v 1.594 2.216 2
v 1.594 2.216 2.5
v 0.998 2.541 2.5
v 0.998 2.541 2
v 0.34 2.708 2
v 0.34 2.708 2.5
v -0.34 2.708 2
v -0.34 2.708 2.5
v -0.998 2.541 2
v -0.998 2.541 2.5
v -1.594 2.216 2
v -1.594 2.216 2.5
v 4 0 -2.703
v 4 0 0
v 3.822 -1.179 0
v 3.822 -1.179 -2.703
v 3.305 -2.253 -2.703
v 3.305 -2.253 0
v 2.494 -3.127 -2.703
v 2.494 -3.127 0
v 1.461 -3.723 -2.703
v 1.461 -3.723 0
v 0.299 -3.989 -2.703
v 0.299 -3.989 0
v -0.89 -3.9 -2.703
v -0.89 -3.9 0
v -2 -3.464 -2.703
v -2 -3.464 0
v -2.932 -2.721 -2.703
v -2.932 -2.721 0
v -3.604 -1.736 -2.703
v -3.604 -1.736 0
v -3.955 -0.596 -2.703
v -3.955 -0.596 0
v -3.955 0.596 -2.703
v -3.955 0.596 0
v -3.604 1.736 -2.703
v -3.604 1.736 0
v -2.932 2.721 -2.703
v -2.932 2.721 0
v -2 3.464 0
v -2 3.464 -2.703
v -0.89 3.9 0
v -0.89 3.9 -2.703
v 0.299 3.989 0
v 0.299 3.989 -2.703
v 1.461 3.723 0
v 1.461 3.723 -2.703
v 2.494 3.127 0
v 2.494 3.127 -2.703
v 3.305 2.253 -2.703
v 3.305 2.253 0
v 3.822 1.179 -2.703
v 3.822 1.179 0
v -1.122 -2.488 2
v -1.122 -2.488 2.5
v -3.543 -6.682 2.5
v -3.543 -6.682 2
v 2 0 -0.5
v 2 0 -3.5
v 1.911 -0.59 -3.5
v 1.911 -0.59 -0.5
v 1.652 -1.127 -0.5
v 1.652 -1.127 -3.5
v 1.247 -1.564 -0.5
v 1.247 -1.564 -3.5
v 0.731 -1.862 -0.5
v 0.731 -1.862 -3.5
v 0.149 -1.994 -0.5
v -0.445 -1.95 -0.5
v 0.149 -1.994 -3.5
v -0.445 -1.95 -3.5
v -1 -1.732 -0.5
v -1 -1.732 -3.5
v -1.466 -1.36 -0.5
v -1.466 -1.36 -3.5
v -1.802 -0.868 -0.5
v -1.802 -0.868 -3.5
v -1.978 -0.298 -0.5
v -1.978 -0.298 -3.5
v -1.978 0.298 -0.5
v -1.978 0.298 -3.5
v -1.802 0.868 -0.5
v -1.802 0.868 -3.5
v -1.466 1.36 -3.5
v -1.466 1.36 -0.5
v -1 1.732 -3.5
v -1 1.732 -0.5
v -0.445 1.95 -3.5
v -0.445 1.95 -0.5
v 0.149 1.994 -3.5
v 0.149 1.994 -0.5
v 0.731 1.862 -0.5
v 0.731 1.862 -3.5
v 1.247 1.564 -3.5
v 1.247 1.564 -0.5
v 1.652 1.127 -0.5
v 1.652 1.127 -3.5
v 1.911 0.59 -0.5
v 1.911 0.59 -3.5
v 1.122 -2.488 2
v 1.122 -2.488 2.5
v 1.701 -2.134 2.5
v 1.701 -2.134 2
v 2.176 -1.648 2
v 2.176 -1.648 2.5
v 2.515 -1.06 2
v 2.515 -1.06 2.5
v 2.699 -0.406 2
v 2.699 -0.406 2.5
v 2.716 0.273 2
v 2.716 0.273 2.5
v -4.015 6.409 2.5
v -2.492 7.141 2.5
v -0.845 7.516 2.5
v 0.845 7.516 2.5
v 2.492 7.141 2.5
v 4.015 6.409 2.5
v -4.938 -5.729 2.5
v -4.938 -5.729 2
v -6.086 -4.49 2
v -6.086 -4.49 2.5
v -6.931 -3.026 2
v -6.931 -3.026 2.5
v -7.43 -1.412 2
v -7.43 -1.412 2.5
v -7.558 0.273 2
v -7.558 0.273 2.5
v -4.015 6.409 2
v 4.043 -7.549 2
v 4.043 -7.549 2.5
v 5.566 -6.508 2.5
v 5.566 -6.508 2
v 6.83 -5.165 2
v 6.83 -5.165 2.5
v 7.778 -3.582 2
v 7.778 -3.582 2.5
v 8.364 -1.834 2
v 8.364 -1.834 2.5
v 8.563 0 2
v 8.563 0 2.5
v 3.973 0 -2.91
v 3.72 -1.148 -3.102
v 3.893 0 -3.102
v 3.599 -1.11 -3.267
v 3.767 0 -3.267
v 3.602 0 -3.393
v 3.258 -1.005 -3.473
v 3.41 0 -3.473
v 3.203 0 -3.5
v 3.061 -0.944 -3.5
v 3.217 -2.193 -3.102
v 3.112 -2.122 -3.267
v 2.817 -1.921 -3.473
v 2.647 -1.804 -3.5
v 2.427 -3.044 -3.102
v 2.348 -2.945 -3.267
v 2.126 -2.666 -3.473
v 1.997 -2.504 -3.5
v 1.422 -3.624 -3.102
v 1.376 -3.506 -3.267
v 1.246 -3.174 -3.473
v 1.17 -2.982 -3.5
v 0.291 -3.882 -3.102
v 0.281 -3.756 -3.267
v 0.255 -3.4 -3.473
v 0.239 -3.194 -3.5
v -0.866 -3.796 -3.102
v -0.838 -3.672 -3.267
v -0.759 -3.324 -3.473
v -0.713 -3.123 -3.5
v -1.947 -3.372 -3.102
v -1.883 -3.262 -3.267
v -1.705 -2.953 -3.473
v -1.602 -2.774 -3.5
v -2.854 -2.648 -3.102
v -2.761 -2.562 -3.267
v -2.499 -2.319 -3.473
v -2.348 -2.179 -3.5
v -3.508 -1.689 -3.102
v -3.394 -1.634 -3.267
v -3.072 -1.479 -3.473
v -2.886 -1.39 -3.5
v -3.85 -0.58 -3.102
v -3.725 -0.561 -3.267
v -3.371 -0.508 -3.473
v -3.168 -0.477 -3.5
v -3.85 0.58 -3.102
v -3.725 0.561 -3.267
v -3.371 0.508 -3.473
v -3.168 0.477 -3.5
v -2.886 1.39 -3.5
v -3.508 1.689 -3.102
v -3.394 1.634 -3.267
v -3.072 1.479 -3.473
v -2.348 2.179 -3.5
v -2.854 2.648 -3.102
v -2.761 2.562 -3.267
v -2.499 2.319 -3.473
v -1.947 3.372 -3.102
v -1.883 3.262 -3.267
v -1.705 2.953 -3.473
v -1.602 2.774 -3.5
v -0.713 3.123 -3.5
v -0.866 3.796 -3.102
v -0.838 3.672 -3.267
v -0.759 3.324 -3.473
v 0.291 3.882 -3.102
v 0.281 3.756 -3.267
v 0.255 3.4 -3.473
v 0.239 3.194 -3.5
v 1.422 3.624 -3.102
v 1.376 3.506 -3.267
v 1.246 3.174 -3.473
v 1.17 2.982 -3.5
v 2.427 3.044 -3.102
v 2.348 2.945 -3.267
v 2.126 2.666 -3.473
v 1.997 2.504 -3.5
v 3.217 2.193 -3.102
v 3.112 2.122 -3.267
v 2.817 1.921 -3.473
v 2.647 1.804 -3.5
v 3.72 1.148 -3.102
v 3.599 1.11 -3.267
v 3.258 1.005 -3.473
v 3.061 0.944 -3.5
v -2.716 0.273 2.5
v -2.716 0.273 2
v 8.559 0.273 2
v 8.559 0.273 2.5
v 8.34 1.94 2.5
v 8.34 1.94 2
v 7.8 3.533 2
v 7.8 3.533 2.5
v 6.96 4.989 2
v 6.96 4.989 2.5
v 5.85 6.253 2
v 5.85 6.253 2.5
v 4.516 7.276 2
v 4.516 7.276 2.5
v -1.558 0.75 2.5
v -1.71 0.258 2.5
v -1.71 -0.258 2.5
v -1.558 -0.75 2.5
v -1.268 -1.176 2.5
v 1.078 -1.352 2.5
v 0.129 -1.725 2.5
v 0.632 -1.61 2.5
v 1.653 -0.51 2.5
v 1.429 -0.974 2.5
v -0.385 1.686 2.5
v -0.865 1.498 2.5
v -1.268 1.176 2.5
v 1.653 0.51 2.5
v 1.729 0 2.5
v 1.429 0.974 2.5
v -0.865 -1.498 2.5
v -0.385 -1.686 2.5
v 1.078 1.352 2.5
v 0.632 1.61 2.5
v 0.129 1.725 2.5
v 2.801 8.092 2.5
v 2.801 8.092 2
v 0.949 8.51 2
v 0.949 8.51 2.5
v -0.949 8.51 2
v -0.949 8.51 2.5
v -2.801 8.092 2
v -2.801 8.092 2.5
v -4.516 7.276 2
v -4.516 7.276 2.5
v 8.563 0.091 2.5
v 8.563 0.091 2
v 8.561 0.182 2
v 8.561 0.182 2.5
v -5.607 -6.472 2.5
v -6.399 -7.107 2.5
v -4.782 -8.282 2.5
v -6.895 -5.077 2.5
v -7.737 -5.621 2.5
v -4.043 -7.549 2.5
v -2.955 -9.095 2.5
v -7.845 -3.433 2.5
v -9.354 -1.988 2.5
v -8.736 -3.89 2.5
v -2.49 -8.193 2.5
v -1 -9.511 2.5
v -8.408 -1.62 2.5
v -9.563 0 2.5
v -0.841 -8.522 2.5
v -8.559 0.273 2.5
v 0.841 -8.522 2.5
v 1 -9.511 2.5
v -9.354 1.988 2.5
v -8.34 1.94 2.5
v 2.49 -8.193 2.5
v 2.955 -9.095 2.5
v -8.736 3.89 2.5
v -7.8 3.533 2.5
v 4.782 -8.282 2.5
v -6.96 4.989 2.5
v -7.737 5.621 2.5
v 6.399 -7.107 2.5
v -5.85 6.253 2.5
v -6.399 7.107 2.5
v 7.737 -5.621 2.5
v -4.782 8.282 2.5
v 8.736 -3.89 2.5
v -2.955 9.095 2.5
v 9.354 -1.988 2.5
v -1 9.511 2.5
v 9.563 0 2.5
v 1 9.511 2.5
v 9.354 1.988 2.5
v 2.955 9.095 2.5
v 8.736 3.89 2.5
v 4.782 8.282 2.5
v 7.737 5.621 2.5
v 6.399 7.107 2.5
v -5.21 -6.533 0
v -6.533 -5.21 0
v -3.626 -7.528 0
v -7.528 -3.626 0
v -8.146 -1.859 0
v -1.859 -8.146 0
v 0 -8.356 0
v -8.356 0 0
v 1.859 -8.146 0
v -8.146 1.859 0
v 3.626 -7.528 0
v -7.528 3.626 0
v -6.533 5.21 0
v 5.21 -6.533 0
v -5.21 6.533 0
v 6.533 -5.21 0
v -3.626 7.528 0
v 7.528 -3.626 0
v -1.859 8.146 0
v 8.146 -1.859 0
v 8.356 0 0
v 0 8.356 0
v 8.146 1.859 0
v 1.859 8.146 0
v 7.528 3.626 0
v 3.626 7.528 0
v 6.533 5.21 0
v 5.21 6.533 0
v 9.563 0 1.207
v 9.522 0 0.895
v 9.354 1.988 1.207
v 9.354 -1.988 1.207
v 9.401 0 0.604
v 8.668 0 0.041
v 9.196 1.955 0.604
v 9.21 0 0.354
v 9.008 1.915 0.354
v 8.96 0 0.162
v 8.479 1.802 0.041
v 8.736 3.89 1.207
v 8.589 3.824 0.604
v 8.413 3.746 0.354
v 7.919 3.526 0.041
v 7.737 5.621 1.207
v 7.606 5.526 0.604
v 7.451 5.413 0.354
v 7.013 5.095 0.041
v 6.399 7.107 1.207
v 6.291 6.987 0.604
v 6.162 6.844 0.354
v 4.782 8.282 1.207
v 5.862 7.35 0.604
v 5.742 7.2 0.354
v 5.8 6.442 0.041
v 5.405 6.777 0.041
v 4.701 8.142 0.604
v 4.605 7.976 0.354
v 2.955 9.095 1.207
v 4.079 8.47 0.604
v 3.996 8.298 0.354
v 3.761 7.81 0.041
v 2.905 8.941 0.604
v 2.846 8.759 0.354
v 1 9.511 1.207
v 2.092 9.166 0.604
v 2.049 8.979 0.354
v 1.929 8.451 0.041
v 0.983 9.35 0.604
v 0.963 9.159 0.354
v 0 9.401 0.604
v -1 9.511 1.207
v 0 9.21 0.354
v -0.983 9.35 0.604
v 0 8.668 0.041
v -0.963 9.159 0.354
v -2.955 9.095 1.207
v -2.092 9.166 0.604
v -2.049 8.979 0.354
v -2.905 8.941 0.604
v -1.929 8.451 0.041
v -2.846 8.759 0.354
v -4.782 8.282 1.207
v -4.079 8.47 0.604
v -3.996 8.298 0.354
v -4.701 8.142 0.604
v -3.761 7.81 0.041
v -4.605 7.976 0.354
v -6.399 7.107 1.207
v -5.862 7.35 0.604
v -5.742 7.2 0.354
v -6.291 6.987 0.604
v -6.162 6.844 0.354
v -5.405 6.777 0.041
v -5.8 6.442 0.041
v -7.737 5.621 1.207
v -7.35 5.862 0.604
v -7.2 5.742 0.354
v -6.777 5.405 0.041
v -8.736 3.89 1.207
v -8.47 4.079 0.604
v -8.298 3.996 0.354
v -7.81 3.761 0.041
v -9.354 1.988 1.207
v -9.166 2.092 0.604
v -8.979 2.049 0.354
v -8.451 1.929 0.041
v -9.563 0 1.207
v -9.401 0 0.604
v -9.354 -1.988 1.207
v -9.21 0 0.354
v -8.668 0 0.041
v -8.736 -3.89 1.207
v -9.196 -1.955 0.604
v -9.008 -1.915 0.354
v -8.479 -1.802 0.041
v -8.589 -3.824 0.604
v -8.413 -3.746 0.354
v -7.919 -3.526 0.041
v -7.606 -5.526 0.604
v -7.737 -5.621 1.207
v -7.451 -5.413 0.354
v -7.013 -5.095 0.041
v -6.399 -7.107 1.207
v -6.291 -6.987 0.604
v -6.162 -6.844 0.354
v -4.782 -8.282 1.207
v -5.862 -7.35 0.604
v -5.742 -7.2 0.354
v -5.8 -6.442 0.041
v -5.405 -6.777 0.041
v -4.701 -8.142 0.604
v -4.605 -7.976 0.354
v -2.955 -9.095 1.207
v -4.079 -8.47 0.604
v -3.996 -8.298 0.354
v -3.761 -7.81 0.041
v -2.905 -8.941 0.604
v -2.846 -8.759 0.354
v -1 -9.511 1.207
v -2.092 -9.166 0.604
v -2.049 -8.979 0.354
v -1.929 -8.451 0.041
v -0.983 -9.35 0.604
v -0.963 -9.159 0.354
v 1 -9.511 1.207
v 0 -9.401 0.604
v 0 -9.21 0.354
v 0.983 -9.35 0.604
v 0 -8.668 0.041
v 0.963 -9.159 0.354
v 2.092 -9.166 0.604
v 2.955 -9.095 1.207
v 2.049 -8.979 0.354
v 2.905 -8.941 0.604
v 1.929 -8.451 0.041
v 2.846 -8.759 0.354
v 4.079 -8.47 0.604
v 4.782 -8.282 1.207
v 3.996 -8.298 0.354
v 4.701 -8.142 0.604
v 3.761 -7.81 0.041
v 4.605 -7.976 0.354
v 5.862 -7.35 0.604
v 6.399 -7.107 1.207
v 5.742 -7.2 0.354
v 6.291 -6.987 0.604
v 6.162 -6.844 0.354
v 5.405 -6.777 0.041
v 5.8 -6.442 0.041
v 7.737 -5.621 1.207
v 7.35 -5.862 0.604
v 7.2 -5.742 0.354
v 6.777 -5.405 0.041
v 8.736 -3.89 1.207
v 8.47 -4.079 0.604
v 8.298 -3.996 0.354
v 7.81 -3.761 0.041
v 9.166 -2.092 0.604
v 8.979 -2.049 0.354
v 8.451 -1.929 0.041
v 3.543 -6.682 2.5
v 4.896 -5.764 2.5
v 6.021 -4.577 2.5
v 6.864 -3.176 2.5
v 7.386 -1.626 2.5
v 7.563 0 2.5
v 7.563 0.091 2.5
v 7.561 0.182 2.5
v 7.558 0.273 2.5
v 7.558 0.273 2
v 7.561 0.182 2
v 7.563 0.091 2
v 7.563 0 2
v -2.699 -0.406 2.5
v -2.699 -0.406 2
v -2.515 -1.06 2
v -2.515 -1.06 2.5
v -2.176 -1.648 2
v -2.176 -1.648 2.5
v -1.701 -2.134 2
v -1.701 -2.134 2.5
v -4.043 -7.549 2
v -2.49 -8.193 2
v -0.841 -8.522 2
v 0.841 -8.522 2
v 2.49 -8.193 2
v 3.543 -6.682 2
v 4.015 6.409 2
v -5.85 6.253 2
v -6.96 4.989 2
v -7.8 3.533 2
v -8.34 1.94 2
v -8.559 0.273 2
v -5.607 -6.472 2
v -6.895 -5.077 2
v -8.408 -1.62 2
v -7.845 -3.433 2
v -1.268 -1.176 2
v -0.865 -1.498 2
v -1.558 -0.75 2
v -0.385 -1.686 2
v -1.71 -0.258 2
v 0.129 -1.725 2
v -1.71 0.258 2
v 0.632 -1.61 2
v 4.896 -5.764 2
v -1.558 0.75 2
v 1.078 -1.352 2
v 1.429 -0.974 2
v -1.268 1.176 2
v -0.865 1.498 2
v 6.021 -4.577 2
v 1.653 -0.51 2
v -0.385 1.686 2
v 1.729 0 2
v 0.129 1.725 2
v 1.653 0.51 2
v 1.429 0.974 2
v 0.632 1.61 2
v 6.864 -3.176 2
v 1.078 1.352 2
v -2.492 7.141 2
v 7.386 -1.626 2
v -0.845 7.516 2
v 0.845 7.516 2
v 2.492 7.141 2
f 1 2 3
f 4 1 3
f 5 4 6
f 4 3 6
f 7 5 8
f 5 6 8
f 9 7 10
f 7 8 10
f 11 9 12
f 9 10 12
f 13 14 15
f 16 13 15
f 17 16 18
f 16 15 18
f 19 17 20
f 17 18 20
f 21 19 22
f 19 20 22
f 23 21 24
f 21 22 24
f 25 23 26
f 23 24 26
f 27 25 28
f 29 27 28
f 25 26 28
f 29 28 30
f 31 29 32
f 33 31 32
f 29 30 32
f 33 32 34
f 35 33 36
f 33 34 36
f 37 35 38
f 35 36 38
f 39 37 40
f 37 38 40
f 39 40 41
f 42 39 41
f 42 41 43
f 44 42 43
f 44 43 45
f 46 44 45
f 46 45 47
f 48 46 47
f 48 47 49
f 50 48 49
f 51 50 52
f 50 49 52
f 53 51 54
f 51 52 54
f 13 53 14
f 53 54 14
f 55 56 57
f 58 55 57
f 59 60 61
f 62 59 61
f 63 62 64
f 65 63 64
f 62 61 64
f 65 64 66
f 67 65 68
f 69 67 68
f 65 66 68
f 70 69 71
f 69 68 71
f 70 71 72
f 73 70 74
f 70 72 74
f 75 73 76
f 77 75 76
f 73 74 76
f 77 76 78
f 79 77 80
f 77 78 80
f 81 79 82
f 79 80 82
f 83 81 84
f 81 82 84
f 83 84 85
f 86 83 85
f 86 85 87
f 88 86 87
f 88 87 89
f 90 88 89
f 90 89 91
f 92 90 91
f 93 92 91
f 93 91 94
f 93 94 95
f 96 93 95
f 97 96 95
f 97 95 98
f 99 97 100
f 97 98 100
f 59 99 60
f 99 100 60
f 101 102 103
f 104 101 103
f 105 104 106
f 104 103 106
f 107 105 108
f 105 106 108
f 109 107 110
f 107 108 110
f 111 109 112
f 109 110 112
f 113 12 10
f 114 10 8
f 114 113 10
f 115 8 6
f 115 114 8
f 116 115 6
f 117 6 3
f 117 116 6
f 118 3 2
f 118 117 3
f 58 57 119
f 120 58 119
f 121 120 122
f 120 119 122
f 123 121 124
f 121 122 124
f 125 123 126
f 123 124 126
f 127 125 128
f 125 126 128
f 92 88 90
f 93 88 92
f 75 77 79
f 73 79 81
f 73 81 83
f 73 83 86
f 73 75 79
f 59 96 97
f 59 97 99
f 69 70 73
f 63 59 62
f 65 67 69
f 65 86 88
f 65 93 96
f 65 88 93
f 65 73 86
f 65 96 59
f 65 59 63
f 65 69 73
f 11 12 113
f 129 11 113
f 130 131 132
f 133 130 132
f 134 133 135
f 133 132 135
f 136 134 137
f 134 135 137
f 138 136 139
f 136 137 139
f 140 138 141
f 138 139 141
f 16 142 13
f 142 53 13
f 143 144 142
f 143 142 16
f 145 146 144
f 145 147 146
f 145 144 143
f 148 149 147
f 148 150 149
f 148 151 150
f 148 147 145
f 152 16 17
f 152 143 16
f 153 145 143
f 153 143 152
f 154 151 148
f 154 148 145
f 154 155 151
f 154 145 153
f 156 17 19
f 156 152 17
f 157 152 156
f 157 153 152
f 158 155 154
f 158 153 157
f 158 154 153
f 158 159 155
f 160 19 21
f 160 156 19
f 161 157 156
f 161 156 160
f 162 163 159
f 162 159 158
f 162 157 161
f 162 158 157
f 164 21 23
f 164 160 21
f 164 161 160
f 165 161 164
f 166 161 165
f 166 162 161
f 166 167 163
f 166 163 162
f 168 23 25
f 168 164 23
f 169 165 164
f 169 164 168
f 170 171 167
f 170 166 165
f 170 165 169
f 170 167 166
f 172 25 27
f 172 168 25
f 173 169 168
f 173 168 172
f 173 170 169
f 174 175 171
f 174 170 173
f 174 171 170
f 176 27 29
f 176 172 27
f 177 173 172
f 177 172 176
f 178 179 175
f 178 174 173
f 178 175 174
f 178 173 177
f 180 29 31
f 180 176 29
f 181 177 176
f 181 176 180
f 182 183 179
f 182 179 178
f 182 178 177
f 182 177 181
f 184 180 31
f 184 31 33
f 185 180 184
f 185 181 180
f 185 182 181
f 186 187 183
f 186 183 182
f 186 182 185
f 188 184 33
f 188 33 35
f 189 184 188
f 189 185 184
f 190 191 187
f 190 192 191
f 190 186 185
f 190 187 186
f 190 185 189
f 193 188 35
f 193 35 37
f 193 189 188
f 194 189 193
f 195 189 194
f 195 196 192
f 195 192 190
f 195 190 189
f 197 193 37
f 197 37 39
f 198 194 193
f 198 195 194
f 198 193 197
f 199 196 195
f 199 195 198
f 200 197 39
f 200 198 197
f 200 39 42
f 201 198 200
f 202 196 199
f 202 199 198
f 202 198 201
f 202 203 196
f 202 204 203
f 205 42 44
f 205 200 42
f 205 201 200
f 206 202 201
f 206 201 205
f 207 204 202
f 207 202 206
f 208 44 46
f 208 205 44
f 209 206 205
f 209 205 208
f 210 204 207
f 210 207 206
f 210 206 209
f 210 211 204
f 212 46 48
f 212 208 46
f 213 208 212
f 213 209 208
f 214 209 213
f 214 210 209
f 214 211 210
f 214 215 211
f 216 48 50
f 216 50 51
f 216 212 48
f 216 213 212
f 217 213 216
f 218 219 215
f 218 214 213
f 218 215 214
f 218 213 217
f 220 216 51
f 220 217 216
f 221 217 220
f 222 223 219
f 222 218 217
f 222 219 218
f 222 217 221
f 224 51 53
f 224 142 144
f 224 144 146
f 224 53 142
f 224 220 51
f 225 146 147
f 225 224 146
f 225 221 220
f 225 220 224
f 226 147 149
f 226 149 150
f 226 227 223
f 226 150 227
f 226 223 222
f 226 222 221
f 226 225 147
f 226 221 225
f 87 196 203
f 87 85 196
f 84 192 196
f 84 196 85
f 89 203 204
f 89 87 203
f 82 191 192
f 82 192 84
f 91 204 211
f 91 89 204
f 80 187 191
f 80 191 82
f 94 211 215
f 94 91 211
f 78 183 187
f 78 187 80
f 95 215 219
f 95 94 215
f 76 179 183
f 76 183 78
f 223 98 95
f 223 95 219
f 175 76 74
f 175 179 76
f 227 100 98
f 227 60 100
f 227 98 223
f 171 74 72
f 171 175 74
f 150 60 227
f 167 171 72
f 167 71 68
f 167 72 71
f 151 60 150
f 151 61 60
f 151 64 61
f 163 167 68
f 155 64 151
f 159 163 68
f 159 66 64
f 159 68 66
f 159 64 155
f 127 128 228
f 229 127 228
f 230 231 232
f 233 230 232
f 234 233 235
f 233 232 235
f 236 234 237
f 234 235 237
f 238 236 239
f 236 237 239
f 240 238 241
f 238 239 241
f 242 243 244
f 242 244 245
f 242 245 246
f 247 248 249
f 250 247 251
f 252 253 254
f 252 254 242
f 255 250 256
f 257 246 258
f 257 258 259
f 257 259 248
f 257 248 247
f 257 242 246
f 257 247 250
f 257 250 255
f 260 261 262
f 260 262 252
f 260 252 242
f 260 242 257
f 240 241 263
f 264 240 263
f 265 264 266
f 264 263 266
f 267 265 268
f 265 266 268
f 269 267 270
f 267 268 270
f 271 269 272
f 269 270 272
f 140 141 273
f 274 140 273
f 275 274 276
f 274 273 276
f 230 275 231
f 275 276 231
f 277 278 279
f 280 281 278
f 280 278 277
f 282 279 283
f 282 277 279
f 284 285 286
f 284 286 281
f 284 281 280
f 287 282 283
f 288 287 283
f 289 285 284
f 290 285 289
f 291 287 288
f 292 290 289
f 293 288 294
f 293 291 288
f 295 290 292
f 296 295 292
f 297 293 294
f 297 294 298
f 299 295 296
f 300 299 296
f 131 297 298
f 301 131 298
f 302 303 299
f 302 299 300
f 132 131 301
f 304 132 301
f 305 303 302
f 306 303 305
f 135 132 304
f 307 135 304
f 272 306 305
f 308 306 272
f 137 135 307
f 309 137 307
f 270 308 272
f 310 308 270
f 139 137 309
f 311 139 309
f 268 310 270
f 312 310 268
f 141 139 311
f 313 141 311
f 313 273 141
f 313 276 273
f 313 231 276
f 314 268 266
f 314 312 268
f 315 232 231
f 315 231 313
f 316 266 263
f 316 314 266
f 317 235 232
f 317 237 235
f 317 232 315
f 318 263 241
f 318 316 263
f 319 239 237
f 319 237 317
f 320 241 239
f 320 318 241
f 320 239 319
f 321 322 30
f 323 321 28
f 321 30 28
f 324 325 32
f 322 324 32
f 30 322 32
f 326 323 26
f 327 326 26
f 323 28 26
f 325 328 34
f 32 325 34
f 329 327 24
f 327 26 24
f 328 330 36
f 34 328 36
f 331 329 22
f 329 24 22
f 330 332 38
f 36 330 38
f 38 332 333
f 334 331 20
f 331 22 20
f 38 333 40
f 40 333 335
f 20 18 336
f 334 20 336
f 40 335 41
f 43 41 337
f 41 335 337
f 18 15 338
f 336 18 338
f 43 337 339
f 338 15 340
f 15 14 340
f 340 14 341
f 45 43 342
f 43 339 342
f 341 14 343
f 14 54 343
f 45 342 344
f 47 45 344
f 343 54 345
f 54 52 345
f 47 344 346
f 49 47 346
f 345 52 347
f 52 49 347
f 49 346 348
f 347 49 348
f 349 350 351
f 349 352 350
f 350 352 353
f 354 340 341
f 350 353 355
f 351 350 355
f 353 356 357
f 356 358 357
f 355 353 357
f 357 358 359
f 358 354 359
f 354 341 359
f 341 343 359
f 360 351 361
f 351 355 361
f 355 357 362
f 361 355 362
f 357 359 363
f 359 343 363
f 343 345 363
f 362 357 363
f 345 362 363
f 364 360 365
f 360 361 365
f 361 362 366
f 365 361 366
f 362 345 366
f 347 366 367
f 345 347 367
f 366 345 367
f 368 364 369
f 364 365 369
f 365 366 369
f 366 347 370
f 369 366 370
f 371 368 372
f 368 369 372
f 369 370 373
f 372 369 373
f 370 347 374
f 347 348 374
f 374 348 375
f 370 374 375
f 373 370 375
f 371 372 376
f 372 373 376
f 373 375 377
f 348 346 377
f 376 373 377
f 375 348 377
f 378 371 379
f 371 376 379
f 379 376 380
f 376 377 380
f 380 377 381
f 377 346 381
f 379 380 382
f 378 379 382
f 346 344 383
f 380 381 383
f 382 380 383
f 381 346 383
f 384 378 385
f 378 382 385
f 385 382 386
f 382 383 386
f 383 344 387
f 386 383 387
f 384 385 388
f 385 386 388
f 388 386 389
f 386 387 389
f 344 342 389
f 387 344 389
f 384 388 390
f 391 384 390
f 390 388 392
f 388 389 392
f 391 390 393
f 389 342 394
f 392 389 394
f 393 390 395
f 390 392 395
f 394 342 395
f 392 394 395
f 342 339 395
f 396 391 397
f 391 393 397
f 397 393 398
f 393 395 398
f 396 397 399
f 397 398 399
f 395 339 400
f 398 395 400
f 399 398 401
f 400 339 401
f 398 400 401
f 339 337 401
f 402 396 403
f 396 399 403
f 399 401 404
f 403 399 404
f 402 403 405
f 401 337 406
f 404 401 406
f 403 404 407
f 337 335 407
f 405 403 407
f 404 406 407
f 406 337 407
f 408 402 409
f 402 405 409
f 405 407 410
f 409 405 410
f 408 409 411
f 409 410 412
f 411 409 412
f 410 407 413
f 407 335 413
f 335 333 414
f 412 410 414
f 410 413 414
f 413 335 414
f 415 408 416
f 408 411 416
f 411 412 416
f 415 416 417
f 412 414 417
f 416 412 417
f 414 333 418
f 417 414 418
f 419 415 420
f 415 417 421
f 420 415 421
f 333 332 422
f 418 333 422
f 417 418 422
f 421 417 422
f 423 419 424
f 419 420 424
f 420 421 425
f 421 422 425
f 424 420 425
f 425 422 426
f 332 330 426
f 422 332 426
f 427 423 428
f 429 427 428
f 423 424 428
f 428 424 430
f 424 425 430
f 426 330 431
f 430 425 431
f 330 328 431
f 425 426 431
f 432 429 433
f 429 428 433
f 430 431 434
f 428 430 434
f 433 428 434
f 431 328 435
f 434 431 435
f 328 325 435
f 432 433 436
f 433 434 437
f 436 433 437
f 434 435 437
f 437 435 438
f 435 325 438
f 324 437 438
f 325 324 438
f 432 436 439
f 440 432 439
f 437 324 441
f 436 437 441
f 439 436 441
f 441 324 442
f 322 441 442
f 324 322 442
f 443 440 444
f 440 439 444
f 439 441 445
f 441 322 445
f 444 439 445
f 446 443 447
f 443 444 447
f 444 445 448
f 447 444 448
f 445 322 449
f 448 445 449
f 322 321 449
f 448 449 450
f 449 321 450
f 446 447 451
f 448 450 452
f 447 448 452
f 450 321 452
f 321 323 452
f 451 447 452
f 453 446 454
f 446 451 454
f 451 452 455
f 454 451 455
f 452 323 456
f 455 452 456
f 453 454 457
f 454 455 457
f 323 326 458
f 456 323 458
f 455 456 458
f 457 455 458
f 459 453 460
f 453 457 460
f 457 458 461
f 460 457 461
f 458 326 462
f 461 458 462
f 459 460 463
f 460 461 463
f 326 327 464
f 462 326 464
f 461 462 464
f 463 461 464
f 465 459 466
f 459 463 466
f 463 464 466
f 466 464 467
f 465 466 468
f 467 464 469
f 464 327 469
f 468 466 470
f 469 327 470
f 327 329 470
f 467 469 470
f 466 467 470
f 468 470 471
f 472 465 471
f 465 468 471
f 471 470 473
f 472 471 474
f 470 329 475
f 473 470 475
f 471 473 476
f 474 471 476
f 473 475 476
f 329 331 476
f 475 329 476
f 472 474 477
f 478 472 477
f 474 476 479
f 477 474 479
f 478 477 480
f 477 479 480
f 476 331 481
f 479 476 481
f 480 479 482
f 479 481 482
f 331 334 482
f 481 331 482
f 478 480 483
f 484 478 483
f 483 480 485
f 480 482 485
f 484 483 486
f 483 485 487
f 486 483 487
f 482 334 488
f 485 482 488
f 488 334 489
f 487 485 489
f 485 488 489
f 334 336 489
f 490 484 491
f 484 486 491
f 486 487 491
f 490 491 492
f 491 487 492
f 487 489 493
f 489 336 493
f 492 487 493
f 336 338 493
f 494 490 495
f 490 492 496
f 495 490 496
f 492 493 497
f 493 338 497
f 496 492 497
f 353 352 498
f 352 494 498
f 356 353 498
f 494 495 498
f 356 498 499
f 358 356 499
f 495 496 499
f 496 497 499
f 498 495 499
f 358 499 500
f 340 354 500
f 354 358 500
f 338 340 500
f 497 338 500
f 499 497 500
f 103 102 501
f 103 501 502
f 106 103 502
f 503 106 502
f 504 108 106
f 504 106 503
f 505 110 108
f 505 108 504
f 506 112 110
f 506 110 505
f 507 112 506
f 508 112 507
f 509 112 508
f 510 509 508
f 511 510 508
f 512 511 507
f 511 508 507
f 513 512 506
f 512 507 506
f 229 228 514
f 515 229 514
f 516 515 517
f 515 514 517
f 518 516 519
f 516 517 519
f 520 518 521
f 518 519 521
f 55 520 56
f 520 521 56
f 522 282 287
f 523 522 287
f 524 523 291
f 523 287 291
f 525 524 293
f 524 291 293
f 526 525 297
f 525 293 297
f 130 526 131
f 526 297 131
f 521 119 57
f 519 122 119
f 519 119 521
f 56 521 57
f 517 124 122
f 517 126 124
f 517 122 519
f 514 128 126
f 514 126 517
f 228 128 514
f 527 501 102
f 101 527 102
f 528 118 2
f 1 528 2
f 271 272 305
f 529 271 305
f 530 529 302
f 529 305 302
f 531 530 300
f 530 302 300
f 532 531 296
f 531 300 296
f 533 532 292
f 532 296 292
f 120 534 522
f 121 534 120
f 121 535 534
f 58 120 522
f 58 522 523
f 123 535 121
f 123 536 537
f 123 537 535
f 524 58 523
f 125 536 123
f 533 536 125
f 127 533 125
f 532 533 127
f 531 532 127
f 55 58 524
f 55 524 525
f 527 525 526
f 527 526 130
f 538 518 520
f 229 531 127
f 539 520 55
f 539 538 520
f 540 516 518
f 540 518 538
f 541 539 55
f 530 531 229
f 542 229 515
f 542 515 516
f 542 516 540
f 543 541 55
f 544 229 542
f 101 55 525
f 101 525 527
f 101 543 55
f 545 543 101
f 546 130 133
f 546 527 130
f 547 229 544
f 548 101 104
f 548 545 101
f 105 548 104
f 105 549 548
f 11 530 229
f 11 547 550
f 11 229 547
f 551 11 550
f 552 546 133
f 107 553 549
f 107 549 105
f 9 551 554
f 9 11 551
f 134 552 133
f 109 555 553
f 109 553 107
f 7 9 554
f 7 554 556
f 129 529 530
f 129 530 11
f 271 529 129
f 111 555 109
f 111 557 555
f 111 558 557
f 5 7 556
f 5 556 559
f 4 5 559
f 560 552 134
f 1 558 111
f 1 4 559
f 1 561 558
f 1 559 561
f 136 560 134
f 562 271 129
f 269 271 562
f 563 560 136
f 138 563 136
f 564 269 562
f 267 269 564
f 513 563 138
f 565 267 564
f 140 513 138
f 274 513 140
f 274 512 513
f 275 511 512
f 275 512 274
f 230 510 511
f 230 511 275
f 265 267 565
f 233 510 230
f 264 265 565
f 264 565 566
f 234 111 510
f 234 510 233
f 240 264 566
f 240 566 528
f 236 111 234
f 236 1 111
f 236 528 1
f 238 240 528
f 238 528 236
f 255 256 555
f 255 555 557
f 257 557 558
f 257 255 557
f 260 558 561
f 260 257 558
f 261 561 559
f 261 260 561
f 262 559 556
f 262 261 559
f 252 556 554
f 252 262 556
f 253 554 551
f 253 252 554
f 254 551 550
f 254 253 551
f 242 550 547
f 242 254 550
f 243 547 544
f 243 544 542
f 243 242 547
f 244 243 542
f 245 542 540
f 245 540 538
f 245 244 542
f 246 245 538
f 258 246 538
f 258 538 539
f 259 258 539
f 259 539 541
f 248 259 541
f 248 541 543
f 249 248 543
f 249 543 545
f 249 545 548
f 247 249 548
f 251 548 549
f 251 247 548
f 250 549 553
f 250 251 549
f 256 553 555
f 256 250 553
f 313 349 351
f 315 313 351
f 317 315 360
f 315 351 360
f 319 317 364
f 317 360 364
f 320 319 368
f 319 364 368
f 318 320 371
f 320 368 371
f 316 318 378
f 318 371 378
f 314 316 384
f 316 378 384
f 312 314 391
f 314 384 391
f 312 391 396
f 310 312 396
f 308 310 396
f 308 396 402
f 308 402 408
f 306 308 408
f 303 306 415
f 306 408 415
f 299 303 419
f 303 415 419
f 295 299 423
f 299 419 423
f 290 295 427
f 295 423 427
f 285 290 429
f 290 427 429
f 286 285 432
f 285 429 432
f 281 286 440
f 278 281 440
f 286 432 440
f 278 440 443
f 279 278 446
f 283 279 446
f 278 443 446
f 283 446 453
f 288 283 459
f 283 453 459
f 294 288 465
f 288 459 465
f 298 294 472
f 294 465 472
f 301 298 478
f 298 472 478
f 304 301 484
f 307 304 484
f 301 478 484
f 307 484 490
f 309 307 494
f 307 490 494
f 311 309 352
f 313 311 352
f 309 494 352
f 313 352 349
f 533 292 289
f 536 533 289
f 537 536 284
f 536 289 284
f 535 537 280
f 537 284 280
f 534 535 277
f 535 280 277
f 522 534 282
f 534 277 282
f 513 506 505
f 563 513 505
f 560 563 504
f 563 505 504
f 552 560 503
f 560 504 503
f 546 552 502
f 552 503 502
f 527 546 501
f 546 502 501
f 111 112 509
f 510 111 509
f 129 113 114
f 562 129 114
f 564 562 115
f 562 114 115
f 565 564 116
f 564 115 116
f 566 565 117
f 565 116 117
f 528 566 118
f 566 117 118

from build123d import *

# Parameters (mm, degrees)
F0_R     = 9.5631
F1_DEPTH = 2.5
F2_R     = 1.729466
F3_DEPTH = 0.5
F4_R     = 4
F5_DEPTH = 3.5
F6_R     = 1.207107
F7_R     = 2
F8_DEPTH = 3
F9_R     = 0.79669


with BuildPart() as f1:
    # F0 (on Top) → F1 (new body)
    with BuildSketch(Plane.XY):
        Circle(F0_R)
    extrude(amount=F1_DEPTH)

    # F2 (on face) → F3 (cut)
    with BuildSketch(Plane.XY.offset(2.5)):
        with BuildLine():
            ThreePointArc((-4.01538, 6.40915), (0, 7.5631), (4.01538, 6.40915))
            Line((4.01538, 6.40915), (4.515668, 7.275673))
            ThreePointArc((4.515668, 7.275673), (0, 8.5631), (-4.515668, 7.275673))
            Line((-4.515668, 7.275673), (-4.01538, 6.40915))
        make_face()
        with BuildLine():
            Line((4.515668, 7.275673), (4.01538, 6.40915))
            ThreePointArc((4.01538, 6.40915), (6.549837, 3.78155), (7.558177, 0.272846))
            Line((7.558177, 0.272846), (8.558752, 0.272846))
            ThreePointArc((8.558752, 0.272846), (7.415862, 4.28155), (4.515668, 7.275673))
        make_face()
        with BuildLine():
            ThreePointArc((-7.558177, 0.272846), (-6.549837, 3.78155), (-4.01538, 6.40915))
            Line((-4.01538, 6.40915), (-4.515668, 7.275673))
            ThreePointArc((-4.515668, 7.275673), (-7.415862, 4.28155), (-8.558752, 0.272846))
            Line((-8.558752, 0.272846), (-7.558177, 0.272846))
        make_face()
        with BuildLine():
            Line((8.558752, 0.272846), (7.558177, 0.272846))
            ThreePointArc((7.558177, 0.272846), (7.561869, 0.136445), (7.5631, 0))
            ThreePointArc((7.5631, 0), (6.480548, -3.8991), (3.542796, -6.681996))
            Line((3.542796, -6.681996), (4.043084, -7.54852))
            ThreePointArc((4.043084, -7.54852), (7.3467, -4.399167), (8.5631, 0))
            ThreePointArc((8.5631, 0), (8.562013, 0.136441), (8.558752, 0.272846))
        make_face()
        with BuildLine():
            ThreePointArc((-3.542796, -6.681996), (-6.549837, -3.78155), (-7.558177, 0.272846))
            Line((-7.558177, 0.272846), (-8.558752, 0.272846))
            ThreePointArc((-8.558752, 0.272846), (-7.415862, -4.28155), (-4.043084, -7.54852))
            Line((-4.043084, -7.54852), (-3.542796, -6.681996))
        make_face()
        with BuildLine():
            ThreePointArc((3.542796, -6.681996), (0, -7.5631), (-3.542796, -6.681996))
            Line((-3.542796, -6.681996), (-4.043084, -7.54852))
            ThreePointArc((-4.043084, -7.54852), (0, -8.5631), (4.043084, -7.54852))
            Line((4.043084, -7.54852), (3.542796, -6.681996))
        make_face()
        with BuildLine():
            Line((4.01538, 6.40915), (1.594189, 2.215524))
            ThreePointArc((1.594189, 2.215524), (0, 2.729466), (-1.594189, 2.215524))
            Line((-1.594189, 2.215524), (-4.01538, 6.40915))
            ThreePointArc((-4.01538, 6.40915), (-6.549837, 3.78155), (-7.558177, 0.272846))
            Line((-7.558177, 0.272846), (-2.715795, 0.272846))
            ThreePointArc((-2.715795, 0.272846), (-2.363787, -1.364733), (-1.121605, -2.48837))
            Line((-1.121605, -2.48837), (-3.542796, -6.681996))
            ThreePointArc((-3.542796, -6.681996), (0, -7.5631), (3.542796, -6.681996))
            Line((3.542796, -6.681996), (1.121605, -2.48837))
            ThreePointArc((1.121605, -2.48837), (2.363787, -1.364733), (2.715795, 0.272846))
            Line((2.715795, 0.272846), (7.558177, 0.272846))
            ThreePointArc((7.558177, 0.272846), (6.549837, 3.78155), (4.01538, 6.40915))
        make_face()
        Circle(F2_R, mode=Mode.SUBTRACT)
    extrude(amount=-F3_DEPTH, mode=Mode.SUBTRACT)

    # F4 (on face) → F5 (join)
    with BuildSketch(Plane(origin=(0, 0, 0), x_dir=(1, 0, 0), z_dir=(0, 0, -1))):
        Circle(F4_R)
    extrude(amount=F5_DEPTH)

    # F6
    f6_edges = [f1.edges().sort_by_distance(p)[0] for p in [
        (-9.5631, 0, 0),
    ]]
    fillet(f6_edges, radius=F6_R)

    # F7 (on face) → F8 (cut)
    with BuildSketch(Plane(origin=(0, 0, -3.5), x_dir=(1, 0, 0), z_dir=(0, 0, -1))):
        Circle(F7_R)
    extrude(amount=-F8_DEPTH, mode=Mode.SUBTRACT)

    # F9
    f9_edges = [f1.edges().sort_by_distance(p)[0] for p in [
        (-4, 0, -3.5),
    ]]
    fillet(f9_edges, radius=F9_R)


solid = f1.part
